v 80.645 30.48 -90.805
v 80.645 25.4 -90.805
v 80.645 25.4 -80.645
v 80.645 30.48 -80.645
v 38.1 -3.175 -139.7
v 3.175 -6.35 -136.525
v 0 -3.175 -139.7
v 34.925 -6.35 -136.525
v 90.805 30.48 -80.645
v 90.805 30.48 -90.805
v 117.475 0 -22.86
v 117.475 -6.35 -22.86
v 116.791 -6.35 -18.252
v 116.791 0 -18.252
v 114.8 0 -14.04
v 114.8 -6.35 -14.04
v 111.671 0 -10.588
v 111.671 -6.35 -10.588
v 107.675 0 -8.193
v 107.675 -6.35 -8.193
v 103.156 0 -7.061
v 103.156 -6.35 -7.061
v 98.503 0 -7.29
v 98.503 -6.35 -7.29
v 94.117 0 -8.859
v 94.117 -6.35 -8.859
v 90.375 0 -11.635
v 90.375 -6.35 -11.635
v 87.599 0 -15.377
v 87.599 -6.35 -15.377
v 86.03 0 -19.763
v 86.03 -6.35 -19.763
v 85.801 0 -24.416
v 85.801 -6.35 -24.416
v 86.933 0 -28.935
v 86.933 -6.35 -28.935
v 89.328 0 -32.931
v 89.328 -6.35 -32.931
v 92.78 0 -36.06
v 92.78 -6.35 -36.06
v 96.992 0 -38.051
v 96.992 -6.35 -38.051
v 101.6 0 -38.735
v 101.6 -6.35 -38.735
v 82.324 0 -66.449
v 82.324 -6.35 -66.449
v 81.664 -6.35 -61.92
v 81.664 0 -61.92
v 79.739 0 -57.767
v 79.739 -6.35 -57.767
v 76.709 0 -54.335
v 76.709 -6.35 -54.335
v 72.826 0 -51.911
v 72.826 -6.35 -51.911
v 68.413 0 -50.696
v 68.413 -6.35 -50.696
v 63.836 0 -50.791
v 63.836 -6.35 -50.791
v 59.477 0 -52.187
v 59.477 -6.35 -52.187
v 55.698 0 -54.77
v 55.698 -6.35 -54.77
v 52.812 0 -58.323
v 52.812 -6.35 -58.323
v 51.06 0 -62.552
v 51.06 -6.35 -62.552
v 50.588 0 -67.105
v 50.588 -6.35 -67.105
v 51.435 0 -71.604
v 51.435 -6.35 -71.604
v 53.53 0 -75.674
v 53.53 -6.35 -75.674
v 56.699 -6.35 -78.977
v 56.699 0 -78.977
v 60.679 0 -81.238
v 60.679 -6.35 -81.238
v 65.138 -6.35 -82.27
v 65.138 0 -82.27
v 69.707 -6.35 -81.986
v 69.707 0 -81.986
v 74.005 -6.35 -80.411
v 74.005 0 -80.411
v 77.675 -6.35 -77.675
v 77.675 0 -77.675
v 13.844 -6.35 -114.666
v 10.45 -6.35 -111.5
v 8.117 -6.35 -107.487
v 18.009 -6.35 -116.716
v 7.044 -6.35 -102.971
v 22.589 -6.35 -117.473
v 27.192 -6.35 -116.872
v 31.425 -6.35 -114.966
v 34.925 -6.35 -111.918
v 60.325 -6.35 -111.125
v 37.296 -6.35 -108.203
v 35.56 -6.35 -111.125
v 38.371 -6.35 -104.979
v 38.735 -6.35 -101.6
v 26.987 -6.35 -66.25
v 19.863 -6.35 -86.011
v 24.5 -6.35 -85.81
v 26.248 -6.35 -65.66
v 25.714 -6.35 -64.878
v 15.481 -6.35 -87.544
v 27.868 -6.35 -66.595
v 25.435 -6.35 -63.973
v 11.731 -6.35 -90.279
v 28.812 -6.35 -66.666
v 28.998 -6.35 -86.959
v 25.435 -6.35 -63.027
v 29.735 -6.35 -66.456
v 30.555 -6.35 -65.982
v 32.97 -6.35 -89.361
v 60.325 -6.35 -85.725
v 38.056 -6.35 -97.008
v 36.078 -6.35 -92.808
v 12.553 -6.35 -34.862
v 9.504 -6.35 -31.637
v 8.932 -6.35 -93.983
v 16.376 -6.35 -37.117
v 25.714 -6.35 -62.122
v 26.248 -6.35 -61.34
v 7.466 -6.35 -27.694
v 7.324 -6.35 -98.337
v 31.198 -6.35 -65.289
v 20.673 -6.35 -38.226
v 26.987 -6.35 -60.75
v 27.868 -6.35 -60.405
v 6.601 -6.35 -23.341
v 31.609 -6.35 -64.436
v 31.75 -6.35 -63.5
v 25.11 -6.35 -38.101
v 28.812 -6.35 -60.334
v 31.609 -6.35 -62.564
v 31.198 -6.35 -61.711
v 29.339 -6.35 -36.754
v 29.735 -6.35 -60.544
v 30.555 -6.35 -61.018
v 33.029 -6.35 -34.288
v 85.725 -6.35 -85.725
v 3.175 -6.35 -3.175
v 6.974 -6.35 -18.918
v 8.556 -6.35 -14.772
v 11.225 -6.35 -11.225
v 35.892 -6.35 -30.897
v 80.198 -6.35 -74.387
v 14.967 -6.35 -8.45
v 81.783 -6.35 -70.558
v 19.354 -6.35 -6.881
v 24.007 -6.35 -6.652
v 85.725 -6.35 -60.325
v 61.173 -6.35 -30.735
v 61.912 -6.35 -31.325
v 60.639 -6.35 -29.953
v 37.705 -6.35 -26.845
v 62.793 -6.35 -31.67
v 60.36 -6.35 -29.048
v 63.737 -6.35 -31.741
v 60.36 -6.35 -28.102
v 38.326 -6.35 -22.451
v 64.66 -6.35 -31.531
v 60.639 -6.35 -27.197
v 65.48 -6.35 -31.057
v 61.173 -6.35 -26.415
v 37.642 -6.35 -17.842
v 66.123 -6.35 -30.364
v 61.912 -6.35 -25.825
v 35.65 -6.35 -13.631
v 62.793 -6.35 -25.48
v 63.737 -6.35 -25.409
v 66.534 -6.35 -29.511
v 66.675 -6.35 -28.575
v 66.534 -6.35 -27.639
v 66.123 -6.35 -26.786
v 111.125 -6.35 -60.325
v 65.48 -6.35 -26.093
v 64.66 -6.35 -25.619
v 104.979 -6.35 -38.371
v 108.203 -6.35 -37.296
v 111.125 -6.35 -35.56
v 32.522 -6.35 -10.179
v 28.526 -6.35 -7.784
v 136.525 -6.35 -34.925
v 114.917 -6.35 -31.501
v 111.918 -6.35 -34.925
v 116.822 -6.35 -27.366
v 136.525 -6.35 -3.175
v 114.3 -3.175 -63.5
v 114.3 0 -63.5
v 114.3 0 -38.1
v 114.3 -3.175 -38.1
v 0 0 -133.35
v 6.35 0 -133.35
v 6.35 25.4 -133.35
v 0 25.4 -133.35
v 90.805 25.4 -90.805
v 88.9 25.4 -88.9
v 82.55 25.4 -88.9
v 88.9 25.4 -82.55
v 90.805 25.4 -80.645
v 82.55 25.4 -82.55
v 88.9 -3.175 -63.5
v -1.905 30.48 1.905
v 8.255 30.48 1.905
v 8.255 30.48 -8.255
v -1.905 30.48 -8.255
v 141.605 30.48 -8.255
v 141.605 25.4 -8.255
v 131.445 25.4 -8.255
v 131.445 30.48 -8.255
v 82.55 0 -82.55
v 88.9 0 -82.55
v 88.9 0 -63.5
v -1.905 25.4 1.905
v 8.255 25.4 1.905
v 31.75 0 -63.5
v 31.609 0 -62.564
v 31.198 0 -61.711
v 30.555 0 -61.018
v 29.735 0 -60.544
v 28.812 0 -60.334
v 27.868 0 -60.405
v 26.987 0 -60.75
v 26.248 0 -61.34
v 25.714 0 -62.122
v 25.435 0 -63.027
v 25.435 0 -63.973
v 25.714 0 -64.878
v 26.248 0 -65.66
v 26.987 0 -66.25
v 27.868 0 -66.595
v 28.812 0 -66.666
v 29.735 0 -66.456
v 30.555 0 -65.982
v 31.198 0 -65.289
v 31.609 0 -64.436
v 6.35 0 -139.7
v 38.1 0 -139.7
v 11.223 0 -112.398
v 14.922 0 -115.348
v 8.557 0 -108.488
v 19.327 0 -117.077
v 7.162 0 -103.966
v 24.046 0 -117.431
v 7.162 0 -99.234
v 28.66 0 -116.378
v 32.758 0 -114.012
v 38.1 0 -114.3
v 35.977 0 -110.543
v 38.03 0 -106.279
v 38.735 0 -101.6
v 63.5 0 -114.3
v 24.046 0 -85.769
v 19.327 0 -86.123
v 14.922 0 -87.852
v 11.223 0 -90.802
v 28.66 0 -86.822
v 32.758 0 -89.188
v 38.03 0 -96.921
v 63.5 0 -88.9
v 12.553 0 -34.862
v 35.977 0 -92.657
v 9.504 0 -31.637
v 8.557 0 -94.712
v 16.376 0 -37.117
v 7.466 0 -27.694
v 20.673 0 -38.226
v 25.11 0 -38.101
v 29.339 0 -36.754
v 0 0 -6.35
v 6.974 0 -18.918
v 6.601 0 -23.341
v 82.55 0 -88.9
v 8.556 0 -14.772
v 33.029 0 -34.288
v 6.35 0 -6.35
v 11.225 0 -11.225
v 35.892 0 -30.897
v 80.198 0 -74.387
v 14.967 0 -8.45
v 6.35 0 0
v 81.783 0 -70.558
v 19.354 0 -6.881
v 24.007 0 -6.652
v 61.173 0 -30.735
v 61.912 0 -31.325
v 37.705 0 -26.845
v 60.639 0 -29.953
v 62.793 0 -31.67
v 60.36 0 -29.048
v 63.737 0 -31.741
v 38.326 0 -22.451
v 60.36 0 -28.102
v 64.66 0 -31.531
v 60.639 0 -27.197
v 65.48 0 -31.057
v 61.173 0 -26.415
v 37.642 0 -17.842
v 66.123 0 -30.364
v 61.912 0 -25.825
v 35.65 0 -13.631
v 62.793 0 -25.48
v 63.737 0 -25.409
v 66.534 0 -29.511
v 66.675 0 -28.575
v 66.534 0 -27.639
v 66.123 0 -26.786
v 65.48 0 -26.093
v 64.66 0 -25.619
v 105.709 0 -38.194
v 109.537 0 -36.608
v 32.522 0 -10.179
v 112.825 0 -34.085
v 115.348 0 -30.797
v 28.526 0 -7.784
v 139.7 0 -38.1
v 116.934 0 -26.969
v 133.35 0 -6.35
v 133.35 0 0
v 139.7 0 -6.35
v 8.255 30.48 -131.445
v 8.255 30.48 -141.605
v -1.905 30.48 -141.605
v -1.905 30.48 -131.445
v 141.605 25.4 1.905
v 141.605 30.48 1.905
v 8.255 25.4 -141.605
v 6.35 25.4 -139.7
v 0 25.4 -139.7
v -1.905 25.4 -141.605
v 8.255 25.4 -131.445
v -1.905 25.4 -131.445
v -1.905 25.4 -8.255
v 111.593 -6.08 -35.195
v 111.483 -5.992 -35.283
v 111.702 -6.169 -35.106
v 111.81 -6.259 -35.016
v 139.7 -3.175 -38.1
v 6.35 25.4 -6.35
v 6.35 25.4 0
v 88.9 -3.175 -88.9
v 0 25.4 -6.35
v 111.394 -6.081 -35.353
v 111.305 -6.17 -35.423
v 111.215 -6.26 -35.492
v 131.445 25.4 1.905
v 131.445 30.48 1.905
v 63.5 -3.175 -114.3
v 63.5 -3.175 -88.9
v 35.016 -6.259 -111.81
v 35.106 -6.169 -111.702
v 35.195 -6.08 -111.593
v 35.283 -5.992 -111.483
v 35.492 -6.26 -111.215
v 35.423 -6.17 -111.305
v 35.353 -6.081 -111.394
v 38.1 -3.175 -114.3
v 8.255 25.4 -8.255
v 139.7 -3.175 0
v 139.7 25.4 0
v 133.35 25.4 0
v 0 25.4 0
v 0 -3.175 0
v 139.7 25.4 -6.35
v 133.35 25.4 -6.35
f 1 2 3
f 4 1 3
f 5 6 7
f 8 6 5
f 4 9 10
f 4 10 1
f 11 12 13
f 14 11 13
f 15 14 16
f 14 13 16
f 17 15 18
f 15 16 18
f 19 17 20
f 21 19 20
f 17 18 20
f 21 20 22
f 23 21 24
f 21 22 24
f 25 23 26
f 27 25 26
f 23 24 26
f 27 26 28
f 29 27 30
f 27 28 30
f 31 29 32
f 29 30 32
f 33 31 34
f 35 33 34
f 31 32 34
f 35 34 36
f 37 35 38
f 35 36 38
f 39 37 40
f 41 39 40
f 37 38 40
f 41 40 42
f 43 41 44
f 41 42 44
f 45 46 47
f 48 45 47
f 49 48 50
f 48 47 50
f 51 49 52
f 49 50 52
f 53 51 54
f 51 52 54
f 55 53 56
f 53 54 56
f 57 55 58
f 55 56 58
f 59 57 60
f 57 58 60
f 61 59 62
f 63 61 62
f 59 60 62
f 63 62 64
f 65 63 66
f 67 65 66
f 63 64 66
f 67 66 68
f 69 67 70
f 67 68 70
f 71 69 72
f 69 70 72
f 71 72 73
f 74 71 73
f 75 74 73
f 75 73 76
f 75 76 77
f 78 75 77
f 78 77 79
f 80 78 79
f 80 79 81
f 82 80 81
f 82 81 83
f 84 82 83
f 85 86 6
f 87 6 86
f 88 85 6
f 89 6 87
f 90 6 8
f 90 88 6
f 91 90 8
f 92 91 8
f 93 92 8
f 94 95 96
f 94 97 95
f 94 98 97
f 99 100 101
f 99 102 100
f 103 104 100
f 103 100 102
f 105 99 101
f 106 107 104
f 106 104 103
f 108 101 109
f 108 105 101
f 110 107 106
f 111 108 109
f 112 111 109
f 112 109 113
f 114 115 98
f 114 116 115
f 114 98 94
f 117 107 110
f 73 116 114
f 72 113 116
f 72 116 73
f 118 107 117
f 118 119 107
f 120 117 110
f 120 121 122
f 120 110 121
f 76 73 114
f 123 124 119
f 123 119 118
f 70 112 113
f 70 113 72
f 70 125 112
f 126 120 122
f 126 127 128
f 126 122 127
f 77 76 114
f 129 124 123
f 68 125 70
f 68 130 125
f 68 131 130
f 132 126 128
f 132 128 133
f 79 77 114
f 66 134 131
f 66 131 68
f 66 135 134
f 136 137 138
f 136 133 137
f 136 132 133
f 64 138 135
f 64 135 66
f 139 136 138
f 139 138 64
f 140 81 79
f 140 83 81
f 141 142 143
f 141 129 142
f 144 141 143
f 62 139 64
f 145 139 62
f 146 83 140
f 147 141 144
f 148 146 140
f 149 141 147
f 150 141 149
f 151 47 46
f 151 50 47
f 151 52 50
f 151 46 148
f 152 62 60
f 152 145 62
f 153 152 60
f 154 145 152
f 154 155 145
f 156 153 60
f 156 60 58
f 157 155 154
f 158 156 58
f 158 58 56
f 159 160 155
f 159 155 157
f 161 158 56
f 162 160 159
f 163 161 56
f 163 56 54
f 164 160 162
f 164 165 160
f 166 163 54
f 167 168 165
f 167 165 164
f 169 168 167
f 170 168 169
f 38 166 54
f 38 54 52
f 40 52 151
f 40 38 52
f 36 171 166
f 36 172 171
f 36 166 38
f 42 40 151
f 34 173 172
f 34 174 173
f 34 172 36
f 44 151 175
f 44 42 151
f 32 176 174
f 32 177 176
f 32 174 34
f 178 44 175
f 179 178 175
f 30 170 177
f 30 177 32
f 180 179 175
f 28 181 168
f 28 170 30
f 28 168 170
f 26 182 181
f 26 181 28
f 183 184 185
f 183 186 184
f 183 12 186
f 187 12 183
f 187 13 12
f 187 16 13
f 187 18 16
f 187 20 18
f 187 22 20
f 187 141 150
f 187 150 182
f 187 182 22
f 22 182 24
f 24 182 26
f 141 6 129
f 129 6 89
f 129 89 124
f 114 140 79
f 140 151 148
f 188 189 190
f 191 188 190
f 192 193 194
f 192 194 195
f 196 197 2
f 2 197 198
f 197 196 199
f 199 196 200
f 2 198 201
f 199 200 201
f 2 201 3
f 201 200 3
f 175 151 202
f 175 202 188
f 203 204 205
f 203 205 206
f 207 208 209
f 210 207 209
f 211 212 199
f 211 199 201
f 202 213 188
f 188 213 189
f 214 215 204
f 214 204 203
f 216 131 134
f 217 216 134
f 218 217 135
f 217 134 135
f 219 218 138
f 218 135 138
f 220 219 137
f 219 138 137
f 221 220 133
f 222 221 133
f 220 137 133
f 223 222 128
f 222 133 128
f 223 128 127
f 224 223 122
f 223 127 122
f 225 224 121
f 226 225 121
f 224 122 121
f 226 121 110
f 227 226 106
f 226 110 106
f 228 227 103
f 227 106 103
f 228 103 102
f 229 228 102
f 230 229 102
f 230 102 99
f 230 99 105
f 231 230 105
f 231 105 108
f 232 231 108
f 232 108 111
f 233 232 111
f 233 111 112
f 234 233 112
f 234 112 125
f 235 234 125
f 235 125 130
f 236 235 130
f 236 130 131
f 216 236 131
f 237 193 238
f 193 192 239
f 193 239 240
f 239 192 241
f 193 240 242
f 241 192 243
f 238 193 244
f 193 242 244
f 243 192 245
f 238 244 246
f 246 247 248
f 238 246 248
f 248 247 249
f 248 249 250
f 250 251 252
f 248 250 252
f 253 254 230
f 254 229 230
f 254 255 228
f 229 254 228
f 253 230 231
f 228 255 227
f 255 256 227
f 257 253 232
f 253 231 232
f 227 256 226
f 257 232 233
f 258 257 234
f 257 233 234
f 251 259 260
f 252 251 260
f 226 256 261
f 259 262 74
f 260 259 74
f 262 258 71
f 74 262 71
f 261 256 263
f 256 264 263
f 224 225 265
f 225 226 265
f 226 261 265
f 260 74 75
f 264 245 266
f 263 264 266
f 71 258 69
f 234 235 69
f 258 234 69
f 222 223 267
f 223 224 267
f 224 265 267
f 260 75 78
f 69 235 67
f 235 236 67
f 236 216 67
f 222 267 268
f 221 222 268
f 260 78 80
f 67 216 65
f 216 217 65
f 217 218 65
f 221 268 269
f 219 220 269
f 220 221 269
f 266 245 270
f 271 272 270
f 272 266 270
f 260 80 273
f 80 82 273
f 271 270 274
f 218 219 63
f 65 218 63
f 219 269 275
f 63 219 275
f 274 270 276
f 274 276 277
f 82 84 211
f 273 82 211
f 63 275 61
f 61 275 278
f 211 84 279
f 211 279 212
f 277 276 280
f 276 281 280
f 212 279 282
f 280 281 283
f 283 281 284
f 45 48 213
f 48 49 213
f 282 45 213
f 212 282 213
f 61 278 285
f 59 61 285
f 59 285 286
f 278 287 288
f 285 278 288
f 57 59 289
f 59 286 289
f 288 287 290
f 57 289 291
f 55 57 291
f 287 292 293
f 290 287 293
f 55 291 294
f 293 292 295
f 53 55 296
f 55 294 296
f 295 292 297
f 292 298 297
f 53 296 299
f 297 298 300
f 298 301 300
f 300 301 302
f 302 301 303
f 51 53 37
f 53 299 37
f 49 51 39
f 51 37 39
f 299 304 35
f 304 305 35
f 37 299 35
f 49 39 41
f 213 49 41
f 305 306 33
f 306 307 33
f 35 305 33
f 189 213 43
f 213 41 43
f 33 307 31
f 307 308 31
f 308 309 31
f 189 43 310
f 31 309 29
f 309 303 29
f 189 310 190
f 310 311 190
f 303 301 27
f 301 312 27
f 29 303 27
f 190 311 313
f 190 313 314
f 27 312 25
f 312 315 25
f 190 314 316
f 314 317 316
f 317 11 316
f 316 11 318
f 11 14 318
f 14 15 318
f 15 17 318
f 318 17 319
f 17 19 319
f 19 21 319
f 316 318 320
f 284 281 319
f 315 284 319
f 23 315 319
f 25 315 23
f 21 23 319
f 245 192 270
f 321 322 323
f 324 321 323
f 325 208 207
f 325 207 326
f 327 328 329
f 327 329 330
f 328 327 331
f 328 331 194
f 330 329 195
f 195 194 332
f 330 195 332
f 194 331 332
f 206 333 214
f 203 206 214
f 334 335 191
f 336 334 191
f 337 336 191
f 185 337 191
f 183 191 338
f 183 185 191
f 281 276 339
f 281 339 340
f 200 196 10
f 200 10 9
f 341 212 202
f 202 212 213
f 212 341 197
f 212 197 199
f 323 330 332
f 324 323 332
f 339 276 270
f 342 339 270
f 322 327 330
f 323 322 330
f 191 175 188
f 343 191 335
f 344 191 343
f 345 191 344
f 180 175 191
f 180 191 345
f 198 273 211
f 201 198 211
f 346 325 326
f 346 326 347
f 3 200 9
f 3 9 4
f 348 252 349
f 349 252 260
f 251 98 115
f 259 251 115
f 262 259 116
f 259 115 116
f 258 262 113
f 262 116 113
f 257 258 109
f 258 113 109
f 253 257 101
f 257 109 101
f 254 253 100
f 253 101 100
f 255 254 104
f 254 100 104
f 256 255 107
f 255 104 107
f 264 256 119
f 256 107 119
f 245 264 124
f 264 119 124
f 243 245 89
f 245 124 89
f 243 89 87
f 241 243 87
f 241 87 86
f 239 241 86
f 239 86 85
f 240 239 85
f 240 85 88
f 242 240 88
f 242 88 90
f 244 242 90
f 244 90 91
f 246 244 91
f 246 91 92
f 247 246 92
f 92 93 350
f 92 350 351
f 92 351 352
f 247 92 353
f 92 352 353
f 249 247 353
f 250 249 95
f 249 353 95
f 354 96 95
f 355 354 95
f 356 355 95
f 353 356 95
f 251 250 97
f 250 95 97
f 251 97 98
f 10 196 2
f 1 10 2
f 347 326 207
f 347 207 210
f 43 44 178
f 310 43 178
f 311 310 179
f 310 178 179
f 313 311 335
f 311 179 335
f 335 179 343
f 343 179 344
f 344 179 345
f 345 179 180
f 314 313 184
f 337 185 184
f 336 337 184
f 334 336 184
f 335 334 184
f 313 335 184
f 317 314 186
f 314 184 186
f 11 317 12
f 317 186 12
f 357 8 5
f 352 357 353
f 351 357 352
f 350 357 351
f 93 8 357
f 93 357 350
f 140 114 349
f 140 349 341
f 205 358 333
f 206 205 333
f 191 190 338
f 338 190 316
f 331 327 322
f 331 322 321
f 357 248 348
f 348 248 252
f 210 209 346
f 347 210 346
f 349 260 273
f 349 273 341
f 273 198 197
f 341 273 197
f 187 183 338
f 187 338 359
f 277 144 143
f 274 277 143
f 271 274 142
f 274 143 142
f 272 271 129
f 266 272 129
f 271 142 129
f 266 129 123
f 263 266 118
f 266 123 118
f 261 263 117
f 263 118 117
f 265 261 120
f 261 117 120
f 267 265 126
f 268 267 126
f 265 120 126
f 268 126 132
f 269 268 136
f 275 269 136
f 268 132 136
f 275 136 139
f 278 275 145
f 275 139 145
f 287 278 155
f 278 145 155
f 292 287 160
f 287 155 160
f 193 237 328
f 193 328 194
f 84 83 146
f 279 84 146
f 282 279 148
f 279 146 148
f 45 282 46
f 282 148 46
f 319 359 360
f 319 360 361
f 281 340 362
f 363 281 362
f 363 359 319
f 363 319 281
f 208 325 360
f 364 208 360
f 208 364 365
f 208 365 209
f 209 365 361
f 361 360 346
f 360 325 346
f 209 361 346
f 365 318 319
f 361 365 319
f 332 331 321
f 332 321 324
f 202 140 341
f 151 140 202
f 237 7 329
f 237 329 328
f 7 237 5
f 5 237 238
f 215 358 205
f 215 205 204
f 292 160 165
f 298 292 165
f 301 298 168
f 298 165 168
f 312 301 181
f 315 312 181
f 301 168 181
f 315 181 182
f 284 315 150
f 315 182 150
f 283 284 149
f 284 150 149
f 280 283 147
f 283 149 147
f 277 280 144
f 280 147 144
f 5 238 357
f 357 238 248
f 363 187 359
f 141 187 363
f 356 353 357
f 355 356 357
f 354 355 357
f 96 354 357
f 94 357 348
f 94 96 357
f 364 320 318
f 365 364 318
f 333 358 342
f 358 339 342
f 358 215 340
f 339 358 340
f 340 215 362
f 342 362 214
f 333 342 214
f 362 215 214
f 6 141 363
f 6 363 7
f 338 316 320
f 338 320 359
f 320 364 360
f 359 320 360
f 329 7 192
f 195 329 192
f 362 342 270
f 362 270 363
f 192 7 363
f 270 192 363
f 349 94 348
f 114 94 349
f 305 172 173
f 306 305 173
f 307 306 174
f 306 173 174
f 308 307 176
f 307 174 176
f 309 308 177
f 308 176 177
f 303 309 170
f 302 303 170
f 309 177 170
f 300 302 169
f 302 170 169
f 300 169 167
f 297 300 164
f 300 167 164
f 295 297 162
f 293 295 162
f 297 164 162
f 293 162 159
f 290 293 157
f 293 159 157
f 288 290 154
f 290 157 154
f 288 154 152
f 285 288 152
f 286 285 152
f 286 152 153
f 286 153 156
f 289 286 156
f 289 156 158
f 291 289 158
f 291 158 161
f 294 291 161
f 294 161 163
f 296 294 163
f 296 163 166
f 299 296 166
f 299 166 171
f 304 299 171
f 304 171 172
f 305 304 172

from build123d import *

# Parameters (mm, degrees)
F1_DEPTH  = 6.35
F3_SIZE   = 3.175
F5_W      = 6.35
F5_H      = 6.35
F6_DEPTH  = 25.4
F2_R      = 15.875
F7_DEPTH  = 25.4
F8_W      = 10.16
F8_H      = 10.16
F8_W_2    = 6.35
F8_H_2    = 6.35
F9_DEPTH  = 5.08
F10_W     = 10.16
F10_H     = 10.16
F10_W_2   = 6.35
F10_H_2   = 6.35
F11_DEPTH = 5.08
F12_W     = 10.16
F12_H     = 10.16
F12_W_2   = 6.35
F12_H_2   = 6.35
F13_DEPTH = 5.08
F14_W     = 10.16
F14_H     = 10.16
F14_W_2   = 6.35
F14_H_2   = 6.35
F15_DEPTH = 5.08
F4_R      = 3.175
F16_DEPTH = 25.4


# Not quite as in the source:
# - a feature names something its author has since deleted; it is built from what else it names


with BuildPart() as f1:
    # F0 (on Front) → F1 (new body)
    with BuildSketch(Plane.XZ):
        Polygon((139.7, 0), (0, 0), (0, -139.7), (38.1, -139.7), (38.1, -114.3), (63.5, -114.3), (63.5, -88.9), (88.9, -88.9), (88.9, -63.5), (114.3, -63.5), (114.3, -38.1), (139.7, -38.1), align=None)
    extrude(amount=F1_DEPTH)

    # F3
    f3_edges = [f1.edges().sort_by_distance(p)[0] for p in [
        (69.85, -6.35, 0),
        (0, -6.35, -69.85),
        (19.05, -6.35, -139.7),
        (38.1, -6.35, -127),
        (50.8, -6.35, -114.3),
        (63.5, -6.35, -101.6),
        (76.2, -6.35, -88.9),
        (88.9, -6.35, -76.2),
        (101.6, -6.35, -63.5),
        (114.3, -6.35, -50.8),
        (127, -6.35, -38.1),
        (139.7, -6.35, -19.05),
    ]]
    chamfer(f3_edges, length=F3_SIZE)

    # F5 (on face) → F6 (join)
    with BuildSketch(Plane(origin=(0, 0, 0), x_dir=(-1, 0, 0), z_dir=(0, 1, 0))):
        with Locations((-3.175, -3.175)):
            Rectangle(F5_W, F5_H)
        with Locations((-3.175, -136.525)):
            Rectangle(F5_W, F5_H)
        with Locations((-85.725, -85.725)):
            Rectangle(F5_W, F5_H)
        with Locations((-136.525, -3.175)):
            Rectangle(F5_W, F5_H)
    extrude(amount=F6_DEPTH)

    # F2 (on face) → F7 (cut)
    with BuildSketch(Plane.XZ.offset(6.35)):
        with BuildLine():
            ThreePointArc((117.475, -22.86), (90.3746798487, -11.6346798487), (101.6, -38.735))
            Line((101.6, -38.735), (101.6, -22.86))
            Line((101.6, -22.86), (117.475, -22.86))
        make_face()
        with BuildLine():
            Line((101.6, -22.86), (101.6, -38.735))
            ThreePointArc((101.6, -38.735), (112.8253201513, -34.0853201513), (117.475, -22.86))
            Line((117.475, -22.86), (101.6, -22.86))
        make_face()
        with BuildLine():
            ThreePointArc((82.3243596973, -66.4493596973), (51.7827721187, -60.3742602085), (77.6746798487, -77.6746798487))
            ThreePointArc((77.6746798487, -77.6746798487), (81.1159472759, -72.5244591861), (82.3243596973, -66.4493596973))
        make_face()
        with Locations((22.86, -101.6)):
            Circle(F2_R)
        with BuildLine():
            ThreePointArc((38.3256403027, -22.4506403027), (28.5257397915, -7.7840527241), (11.2253201513, -11.2253201513))
            ThreePointArc((11.2253201513, -11.2253201513), (16.3755408139, -37.1172278813), (38.3256403027, -22.4506403027))
        make_face()
    extrude(amount=-F7_DEPTH, mode=Mode.SUBTRACT)

    # F8 (on face) → F9 (join)
    with BuildSketch(Plane(origin=(0, 25.4, 0), x_dir=(-1, 0, 0), z_dir=(0, 1, 0))):
        with Locations((-3.175, -3.175)):
            Rectangle(F8_W, F8_H)
        with Locations((-3.175, -3.175)):
            Rectangle(F8_W_2, F8_H_2, mode=Mode.SUBTRACT)
        with Locations((-3.175, -3.175)):
            Rectangle(F8_W_2, F8_H_2)
    extrude(amount=F9_DEPTH)

    # F10 (on face) → F11 (join)
    with BuildSketch(Plane(origin=(0, 25.4, 0), x_dir=(-1, 0, 0), z_dir=(0, 1, 0))):
        with Locations((-136.525, -3.175)):
            Rectangle(F10_W, F10_H)
        with Locations((-136.525, -3.175)):
            Rectangle(F10_W_2, F10_H_2, mode=Mode.SUBTRACT)
        with Locations((-136.525, -3.175)):
            Rectangle(F10_W_2, F10_H_2)
    extrude(amount=F11_DEPTH)

    # F12 (on face) → F13 (join)
    with BuildSketch(Plane(origin=(0, 25.4, 0), x_dir=(-1, 0, 0), z_dir=(0, 1, 0))):
        with Locations((-85.725, -85.725)):
            Rectangle(F12_W, F12_H)
        with Locations((-85.725, -85.725)):
            Rectangle(F12_W_2, F12_H_2, mode=Mode.SUBTRACT)
        with Locations((-85.725, -85.725)):
            Rectangle(F12_W_2, F12_H_2)
    extrude(amount=F13_DEPTH)

    # F14 (on face) → F15 (join)
    with BuildSketch(Plane(origin=(0, 25.4, 0), x_dir=(-1, 0, 0), z_dir=(0, 1, 0))):
        with Locations((-3.175, -136.525)):
            Rectangle(F14_W, F14_H)
        with Locations((-3.175, -136.525)):
            Rectangle(F14_W_2, F14_H_2, mode=Mode.SUBTRACT)
        with Locations((-3.175, -136.525)):
            Rectangle(F14_W_2, F14_H_2)
    extrude(amount=F15_DEPTH)

    # F4 (on face) → F16 (cut)
    with BuildSketch(Plane.XZ.offset(6.35)):
        with Locations((63.5, -28.575)):
            Circle(F4_R)
        with Locations((28.575, -63.5)):
            Circle(F4_R)
    extrude(amount=-F16_DEPTH, mode=Mode.SUBTRACT)


solid = f1.part
